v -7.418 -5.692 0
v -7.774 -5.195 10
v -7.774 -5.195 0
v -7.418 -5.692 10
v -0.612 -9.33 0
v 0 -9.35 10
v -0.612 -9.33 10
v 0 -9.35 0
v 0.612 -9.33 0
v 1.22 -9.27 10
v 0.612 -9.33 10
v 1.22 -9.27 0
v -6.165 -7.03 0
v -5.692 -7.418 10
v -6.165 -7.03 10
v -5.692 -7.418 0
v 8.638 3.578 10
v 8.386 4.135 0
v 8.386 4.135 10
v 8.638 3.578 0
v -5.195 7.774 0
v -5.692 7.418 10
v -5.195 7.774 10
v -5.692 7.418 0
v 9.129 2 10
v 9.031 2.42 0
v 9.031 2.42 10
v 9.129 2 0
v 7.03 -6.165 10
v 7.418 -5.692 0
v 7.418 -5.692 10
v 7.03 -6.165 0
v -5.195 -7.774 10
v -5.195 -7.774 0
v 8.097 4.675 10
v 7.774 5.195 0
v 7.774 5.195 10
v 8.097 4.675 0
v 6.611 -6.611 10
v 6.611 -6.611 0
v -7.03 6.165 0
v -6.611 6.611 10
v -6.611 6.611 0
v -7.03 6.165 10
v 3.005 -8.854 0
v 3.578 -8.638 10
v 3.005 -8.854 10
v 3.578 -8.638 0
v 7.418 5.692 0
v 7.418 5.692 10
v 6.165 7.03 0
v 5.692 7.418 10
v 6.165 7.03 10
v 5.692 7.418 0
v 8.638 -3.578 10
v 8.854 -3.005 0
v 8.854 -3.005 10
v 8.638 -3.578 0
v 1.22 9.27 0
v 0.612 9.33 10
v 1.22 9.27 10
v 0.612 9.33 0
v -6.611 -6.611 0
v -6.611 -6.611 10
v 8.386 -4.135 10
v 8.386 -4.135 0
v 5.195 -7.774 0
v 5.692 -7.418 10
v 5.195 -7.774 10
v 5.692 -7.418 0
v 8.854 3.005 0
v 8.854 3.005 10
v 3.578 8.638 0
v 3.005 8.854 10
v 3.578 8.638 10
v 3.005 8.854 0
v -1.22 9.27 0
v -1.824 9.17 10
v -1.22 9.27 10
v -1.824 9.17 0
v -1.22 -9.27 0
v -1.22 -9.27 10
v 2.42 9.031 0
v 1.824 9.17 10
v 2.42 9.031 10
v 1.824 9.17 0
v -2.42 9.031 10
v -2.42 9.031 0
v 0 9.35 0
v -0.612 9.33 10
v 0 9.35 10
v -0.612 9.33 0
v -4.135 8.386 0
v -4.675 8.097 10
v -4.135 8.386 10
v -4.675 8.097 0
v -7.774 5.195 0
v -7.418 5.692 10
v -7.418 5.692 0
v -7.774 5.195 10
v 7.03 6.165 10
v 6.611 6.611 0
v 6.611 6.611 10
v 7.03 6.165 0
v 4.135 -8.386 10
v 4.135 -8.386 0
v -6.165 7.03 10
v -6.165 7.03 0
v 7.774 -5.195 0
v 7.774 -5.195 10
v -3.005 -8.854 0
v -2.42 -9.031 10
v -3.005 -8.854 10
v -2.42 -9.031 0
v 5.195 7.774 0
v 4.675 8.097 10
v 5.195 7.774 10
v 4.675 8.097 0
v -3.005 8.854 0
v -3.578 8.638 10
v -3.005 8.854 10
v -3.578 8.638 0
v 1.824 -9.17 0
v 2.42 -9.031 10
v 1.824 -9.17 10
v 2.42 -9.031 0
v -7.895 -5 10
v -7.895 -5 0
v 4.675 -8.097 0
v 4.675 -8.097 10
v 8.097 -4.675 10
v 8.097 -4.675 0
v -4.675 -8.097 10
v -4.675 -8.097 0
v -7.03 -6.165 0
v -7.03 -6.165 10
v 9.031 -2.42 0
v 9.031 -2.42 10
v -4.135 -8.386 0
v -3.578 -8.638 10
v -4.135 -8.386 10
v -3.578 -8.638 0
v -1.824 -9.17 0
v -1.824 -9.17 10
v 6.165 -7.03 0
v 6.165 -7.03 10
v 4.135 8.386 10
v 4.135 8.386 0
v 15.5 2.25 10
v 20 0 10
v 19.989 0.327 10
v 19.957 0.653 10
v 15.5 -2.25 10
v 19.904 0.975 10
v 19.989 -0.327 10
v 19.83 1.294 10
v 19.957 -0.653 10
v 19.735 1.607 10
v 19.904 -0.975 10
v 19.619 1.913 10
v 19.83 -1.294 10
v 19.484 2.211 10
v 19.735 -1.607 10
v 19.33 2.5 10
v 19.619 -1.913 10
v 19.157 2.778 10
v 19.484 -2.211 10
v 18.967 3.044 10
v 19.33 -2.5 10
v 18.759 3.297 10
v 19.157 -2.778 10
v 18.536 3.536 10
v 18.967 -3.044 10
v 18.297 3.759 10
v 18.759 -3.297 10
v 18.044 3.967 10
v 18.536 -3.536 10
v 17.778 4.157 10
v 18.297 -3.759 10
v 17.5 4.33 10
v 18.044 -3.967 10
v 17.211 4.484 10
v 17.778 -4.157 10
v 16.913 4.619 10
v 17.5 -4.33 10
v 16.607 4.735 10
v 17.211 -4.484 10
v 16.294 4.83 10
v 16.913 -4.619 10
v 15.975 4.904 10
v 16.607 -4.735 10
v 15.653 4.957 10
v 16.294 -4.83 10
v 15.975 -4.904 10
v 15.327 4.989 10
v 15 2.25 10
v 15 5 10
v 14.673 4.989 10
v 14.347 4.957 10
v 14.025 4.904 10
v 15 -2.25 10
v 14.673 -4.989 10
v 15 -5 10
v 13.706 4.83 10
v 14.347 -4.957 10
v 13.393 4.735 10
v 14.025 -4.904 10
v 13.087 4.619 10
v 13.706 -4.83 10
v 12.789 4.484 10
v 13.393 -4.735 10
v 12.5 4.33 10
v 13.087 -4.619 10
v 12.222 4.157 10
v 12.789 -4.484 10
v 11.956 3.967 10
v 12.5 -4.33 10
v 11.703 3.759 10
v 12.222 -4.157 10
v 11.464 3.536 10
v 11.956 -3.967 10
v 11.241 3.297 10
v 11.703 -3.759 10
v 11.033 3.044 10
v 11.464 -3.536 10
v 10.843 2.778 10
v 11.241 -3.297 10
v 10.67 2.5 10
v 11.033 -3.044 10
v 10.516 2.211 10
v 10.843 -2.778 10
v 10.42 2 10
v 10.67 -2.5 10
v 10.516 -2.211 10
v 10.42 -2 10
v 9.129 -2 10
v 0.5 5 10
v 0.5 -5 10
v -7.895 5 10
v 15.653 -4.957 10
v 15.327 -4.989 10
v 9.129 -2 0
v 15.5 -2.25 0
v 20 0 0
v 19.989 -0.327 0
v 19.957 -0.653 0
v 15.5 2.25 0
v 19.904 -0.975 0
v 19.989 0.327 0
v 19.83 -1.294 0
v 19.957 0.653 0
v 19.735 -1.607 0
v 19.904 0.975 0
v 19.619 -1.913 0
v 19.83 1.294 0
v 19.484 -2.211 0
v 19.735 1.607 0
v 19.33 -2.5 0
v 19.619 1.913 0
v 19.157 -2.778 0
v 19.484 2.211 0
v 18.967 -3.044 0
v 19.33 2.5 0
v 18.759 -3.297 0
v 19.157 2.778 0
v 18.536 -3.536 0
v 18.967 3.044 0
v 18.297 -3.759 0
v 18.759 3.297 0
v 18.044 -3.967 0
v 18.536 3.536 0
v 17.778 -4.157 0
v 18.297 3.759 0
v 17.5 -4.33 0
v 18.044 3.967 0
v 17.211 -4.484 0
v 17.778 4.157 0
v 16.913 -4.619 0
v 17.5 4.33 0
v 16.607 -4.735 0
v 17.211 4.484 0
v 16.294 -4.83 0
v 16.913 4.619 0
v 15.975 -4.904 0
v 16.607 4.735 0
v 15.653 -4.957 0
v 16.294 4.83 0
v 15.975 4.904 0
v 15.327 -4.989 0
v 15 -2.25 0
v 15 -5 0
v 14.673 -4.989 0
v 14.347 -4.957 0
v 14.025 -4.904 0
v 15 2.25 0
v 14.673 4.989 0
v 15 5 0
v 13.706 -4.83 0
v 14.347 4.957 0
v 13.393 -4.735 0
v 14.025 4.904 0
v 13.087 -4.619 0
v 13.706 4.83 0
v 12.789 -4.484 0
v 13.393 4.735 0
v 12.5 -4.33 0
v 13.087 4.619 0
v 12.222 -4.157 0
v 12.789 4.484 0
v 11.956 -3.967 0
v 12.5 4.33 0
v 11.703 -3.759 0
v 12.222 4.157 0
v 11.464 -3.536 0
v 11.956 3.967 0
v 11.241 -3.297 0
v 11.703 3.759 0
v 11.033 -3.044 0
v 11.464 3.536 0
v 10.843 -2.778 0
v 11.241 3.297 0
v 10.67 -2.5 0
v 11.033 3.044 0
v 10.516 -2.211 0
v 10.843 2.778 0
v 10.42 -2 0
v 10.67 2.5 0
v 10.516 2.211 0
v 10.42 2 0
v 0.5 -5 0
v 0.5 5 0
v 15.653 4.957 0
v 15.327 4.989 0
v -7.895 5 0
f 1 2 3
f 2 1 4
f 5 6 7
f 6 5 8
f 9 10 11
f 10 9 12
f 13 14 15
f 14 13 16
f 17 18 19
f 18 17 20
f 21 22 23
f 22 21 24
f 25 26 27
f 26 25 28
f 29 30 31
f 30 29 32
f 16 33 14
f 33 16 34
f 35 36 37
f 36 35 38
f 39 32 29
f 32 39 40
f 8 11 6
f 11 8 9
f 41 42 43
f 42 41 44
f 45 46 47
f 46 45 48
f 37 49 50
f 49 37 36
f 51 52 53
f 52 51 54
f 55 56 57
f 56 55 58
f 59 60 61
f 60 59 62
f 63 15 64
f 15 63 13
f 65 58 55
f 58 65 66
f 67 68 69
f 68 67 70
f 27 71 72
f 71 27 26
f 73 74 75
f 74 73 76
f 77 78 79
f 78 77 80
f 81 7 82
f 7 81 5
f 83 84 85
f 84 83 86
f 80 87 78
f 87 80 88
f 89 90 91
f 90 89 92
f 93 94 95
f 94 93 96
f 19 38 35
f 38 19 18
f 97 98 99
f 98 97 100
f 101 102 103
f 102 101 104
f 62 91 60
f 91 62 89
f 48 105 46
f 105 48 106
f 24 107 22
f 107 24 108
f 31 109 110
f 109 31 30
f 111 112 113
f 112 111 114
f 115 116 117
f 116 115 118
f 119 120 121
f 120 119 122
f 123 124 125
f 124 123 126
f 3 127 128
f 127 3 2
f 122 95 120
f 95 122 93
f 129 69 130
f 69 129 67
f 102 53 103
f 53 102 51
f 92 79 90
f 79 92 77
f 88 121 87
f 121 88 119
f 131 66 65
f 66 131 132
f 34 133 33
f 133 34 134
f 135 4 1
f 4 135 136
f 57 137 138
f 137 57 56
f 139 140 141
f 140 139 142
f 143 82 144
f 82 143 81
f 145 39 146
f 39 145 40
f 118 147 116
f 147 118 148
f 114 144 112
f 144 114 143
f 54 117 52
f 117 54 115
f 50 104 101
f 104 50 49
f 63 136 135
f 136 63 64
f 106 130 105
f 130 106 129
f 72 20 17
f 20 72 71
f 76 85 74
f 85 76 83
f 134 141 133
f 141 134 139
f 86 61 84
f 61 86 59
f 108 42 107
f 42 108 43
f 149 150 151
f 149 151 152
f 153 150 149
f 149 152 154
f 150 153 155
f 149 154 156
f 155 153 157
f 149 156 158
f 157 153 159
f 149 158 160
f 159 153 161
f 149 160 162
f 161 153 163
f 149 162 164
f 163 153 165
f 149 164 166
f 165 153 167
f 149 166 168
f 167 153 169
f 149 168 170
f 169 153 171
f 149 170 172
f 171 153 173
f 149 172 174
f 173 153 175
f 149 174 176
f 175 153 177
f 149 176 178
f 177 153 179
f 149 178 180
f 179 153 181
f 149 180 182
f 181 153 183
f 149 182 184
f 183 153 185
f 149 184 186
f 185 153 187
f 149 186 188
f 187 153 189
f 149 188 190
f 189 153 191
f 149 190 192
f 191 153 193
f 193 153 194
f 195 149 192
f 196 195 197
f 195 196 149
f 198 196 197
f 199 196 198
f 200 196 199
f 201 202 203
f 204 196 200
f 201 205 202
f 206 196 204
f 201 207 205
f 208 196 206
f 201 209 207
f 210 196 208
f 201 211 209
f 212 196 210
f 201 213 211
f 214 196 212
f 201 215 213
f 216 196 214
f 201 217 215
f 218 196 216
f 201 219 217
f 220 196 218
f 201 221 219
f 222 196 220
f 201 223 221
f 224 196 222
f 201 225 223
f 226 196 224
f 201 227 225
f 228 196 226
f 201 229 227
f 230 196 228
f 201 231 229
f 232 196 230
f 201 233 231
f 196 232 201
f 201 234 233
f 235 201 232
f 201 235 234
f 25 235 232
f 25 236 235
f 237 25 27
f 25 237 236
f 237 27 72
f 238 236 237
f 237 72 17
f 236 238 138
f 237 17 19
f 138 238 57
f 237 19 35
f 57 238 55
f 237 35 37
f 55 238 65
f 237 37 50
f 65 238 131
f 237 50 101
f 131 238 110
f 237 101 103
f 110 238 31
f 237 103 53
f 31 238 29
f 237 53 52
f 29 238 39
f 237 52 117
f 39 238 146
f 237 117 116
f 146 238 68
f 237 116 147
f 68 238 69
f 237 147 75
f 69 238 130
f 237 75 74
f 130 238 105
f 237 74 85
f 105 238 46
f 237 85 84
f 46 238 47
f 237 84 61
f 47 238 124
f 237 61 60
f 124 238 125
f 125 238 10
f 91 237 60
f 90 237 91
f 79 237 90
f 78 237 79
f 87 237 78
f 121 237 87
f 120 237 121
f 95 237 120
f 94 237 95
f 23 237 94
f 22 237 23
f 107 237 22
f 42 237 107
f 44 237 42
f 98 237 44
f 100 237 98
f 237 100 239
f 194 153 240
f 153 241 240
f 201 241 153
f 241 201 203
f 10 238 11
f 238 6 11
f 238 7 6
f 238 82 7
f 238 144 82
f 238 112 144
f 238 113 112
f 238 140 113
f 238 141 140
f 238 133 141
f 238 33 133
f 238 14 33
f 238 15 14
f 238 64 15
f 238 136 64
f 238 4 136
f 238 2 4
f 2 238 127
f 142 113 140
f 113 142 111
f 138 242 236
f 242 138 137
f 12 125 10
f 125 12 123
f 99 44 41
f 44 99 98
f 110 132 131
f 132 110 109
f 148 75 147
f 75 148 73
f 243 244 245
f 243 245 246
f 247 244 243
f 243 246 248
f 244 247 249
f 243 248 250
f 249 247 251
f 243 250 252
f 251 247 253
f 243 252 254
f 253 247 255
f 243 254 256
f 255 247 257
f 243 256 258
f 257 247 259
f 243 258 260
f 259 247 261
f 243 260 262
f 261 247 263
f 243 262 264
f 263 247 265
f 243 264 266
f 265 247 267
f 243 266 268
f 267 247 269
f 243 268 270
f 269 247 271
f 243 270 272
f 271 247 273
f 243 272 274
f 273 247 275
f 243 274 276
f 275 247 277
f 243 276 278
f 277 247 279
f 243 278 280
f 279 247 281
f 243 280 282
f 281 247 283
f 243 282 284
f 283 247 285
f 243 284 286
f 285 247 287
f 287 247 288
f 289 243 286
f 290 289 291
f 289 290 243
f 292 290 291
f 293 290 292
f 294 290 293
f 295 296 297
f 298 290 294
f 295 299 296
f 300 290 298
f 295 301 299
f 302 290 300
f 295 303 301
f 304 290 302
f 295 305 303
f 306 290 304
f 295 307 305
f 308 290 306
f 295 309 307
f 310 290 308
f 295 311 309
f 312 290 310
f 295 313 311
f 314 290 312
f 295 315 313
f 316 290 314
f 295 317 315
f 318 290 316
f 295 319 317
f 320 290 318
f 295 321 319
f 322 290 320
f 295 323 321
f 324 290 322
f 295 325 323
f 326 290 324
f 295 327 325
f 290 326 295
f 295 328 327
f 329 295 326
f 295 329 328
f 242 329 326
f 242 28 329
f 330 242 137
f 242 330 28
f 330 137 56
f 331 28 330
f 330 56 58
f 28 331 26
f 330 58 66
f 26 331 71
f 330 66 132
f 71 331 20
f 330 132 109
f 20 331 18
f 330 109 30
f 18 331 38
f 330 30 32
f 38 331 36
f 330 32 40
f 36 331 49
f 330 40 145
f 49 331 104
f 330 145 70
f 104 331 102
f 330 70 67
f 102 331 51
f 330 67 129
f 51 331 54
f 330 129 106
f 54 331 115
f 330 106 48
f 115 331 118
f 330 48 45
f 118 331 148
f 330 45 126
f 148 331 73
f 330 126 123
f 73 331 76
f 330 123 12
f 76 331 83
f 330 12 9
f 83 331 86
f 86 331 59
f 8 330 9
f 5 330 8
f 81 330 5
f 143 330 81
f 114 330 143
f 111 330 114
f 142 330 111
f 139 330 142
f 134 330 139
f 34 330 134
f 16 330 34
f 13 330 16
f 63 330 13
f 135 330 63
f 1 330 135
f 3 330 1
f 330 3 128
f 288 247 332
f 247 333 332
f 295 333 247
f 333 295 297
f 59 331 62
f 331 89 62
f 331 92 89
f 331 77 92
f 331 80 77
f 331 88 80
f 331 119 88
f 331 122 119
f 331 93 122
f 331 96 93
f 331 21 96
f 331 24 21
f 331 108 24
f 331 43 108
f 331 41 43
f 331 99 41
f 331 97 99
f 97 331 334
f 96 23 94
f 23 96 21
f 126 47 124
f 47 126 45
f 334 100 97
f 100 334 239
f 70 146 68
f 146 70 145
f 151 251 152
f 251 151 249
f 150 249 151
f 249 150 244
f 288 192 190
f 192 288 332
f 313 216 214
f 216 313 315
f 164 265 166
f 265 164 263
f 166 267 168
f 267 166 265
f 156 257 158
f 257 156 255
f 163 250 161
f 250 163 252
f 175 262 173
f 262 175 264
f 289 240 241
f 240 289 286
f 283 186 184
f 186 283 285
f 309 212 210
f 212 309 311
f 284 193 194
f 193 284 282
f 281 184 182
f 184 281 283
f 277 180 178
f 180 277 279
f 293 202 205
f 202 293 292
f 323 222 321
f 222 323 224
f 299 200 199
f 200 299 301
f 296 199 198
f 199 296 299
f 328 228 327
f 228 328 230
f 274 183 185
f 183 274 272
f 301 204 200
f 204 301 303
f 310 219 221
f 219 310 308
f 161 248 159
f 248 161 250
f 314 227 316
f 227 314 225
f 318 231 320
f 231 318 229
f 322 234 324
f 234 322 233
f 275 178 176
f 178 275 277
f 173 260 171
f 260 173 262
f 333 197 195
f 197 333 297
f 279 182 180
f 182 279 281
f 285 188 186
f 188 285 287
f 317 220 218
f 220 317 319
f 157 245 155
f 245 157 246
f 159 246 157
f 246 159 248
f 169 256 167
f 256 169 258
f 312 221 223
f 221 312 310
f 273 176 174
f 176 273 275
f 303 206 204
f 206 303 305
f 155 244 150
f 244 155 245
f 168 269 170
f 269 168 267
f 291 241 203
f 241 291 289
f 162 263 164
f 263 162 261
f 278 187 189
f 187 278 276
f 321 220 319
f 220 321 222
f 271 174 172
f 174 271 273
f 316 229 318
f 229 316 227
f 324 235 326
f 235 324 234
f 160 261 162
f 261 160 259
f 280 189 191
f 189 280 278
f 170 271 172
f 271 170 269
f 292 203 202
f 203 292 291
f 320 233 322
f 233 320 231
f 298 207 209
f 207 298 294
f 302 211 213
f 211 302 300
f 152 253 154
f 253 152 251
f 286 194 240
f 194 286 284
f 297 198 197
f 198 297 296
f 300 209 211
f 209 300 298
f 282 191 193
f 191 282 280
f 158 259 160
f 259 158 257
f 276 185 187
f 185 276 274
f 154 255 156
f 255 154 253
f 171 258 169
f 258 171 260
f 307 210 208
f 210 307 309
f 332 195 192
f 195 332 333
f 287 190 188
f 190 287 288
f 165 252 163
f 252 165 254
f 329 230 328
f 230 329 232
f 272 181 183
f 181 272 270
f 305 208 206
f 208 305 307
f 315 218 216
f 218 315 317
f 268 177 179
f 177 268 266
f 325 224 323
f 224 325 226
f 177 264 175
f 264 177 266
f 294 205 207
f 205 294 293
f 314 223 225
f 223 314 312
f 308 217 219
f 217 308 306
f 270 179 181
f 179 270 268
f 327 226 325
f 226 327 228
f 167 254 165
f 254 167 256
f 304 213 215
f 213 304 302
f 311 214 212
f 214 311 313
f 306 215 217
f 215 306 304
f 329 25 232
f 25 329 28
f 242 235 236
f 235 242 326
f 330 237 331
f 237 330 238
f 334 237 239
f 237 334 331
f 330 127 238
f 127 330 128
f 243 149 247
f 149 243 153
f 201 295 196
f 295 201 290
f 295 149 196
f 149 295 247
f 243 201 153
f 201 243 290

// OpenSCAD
// Tubing organiser clip for a 12.7 mm lab stand rod
// Print orientation: flat on the bed, builds up in +Z

// ---------------- Parameters ----------------
rod_d      = 12.7;   // stand rod diameter
ring_w     = 3;      // rod ring wall thickness
rod_r      = rod_d/2 + ring_w;  // rod ring outer radius (18.7 mm)

tub_d      = 6;      // tubing inner diameter
tub_w      = 2;      // tubing wall thickness
tub_r      = tub_d/2 + tub_w;  // tubing outer radius (5 mm)

bridge_x0  = 8;      // bridge start (X)
bridge_x1  = 12;     // bridge end (X)
bridge_w   = bridge_x1 - bridge_x0;  // bridge width (6 mm)

opening1_w = 10;     // rod ring opening width (Y)
opening2_w = 4.5;    // tubing opening width (Y)

eps        = 0.5;    // cutter overshoot past faces
$fn        = 96;     // curve resolution

// ---------------- Model ----------------
difference() {
    union() {
        // Rod ring, centred at origin
        cylinder(r = rod_r, h = 10);

        // Tubing ring, centred at x = 15, y = 0
        translate([15, 0, 0])
            cylinder(r = tub_r, h = 10);

        // Solid bridge between x = 8 and x = 12
        translate([bridge_x0, -bridge_w/2, 0])
            cube([bridge_w, bridge_w, 10]);
    }

    // Rod ring opening: x < 0 and -5 < y < 5
    translate([-rod_r - eps, -opening1_w/2, -eps])
        cube([rod_r + 2*eps, opening1_w, 10 + 2*eps]);

    // Tubing opening: x > 15 and -2.25 < y < 2.25
    translate([15, -opening2_w/2, -eps])
        cube([eps, opening2_w, 10 + 2*eps]);
}
